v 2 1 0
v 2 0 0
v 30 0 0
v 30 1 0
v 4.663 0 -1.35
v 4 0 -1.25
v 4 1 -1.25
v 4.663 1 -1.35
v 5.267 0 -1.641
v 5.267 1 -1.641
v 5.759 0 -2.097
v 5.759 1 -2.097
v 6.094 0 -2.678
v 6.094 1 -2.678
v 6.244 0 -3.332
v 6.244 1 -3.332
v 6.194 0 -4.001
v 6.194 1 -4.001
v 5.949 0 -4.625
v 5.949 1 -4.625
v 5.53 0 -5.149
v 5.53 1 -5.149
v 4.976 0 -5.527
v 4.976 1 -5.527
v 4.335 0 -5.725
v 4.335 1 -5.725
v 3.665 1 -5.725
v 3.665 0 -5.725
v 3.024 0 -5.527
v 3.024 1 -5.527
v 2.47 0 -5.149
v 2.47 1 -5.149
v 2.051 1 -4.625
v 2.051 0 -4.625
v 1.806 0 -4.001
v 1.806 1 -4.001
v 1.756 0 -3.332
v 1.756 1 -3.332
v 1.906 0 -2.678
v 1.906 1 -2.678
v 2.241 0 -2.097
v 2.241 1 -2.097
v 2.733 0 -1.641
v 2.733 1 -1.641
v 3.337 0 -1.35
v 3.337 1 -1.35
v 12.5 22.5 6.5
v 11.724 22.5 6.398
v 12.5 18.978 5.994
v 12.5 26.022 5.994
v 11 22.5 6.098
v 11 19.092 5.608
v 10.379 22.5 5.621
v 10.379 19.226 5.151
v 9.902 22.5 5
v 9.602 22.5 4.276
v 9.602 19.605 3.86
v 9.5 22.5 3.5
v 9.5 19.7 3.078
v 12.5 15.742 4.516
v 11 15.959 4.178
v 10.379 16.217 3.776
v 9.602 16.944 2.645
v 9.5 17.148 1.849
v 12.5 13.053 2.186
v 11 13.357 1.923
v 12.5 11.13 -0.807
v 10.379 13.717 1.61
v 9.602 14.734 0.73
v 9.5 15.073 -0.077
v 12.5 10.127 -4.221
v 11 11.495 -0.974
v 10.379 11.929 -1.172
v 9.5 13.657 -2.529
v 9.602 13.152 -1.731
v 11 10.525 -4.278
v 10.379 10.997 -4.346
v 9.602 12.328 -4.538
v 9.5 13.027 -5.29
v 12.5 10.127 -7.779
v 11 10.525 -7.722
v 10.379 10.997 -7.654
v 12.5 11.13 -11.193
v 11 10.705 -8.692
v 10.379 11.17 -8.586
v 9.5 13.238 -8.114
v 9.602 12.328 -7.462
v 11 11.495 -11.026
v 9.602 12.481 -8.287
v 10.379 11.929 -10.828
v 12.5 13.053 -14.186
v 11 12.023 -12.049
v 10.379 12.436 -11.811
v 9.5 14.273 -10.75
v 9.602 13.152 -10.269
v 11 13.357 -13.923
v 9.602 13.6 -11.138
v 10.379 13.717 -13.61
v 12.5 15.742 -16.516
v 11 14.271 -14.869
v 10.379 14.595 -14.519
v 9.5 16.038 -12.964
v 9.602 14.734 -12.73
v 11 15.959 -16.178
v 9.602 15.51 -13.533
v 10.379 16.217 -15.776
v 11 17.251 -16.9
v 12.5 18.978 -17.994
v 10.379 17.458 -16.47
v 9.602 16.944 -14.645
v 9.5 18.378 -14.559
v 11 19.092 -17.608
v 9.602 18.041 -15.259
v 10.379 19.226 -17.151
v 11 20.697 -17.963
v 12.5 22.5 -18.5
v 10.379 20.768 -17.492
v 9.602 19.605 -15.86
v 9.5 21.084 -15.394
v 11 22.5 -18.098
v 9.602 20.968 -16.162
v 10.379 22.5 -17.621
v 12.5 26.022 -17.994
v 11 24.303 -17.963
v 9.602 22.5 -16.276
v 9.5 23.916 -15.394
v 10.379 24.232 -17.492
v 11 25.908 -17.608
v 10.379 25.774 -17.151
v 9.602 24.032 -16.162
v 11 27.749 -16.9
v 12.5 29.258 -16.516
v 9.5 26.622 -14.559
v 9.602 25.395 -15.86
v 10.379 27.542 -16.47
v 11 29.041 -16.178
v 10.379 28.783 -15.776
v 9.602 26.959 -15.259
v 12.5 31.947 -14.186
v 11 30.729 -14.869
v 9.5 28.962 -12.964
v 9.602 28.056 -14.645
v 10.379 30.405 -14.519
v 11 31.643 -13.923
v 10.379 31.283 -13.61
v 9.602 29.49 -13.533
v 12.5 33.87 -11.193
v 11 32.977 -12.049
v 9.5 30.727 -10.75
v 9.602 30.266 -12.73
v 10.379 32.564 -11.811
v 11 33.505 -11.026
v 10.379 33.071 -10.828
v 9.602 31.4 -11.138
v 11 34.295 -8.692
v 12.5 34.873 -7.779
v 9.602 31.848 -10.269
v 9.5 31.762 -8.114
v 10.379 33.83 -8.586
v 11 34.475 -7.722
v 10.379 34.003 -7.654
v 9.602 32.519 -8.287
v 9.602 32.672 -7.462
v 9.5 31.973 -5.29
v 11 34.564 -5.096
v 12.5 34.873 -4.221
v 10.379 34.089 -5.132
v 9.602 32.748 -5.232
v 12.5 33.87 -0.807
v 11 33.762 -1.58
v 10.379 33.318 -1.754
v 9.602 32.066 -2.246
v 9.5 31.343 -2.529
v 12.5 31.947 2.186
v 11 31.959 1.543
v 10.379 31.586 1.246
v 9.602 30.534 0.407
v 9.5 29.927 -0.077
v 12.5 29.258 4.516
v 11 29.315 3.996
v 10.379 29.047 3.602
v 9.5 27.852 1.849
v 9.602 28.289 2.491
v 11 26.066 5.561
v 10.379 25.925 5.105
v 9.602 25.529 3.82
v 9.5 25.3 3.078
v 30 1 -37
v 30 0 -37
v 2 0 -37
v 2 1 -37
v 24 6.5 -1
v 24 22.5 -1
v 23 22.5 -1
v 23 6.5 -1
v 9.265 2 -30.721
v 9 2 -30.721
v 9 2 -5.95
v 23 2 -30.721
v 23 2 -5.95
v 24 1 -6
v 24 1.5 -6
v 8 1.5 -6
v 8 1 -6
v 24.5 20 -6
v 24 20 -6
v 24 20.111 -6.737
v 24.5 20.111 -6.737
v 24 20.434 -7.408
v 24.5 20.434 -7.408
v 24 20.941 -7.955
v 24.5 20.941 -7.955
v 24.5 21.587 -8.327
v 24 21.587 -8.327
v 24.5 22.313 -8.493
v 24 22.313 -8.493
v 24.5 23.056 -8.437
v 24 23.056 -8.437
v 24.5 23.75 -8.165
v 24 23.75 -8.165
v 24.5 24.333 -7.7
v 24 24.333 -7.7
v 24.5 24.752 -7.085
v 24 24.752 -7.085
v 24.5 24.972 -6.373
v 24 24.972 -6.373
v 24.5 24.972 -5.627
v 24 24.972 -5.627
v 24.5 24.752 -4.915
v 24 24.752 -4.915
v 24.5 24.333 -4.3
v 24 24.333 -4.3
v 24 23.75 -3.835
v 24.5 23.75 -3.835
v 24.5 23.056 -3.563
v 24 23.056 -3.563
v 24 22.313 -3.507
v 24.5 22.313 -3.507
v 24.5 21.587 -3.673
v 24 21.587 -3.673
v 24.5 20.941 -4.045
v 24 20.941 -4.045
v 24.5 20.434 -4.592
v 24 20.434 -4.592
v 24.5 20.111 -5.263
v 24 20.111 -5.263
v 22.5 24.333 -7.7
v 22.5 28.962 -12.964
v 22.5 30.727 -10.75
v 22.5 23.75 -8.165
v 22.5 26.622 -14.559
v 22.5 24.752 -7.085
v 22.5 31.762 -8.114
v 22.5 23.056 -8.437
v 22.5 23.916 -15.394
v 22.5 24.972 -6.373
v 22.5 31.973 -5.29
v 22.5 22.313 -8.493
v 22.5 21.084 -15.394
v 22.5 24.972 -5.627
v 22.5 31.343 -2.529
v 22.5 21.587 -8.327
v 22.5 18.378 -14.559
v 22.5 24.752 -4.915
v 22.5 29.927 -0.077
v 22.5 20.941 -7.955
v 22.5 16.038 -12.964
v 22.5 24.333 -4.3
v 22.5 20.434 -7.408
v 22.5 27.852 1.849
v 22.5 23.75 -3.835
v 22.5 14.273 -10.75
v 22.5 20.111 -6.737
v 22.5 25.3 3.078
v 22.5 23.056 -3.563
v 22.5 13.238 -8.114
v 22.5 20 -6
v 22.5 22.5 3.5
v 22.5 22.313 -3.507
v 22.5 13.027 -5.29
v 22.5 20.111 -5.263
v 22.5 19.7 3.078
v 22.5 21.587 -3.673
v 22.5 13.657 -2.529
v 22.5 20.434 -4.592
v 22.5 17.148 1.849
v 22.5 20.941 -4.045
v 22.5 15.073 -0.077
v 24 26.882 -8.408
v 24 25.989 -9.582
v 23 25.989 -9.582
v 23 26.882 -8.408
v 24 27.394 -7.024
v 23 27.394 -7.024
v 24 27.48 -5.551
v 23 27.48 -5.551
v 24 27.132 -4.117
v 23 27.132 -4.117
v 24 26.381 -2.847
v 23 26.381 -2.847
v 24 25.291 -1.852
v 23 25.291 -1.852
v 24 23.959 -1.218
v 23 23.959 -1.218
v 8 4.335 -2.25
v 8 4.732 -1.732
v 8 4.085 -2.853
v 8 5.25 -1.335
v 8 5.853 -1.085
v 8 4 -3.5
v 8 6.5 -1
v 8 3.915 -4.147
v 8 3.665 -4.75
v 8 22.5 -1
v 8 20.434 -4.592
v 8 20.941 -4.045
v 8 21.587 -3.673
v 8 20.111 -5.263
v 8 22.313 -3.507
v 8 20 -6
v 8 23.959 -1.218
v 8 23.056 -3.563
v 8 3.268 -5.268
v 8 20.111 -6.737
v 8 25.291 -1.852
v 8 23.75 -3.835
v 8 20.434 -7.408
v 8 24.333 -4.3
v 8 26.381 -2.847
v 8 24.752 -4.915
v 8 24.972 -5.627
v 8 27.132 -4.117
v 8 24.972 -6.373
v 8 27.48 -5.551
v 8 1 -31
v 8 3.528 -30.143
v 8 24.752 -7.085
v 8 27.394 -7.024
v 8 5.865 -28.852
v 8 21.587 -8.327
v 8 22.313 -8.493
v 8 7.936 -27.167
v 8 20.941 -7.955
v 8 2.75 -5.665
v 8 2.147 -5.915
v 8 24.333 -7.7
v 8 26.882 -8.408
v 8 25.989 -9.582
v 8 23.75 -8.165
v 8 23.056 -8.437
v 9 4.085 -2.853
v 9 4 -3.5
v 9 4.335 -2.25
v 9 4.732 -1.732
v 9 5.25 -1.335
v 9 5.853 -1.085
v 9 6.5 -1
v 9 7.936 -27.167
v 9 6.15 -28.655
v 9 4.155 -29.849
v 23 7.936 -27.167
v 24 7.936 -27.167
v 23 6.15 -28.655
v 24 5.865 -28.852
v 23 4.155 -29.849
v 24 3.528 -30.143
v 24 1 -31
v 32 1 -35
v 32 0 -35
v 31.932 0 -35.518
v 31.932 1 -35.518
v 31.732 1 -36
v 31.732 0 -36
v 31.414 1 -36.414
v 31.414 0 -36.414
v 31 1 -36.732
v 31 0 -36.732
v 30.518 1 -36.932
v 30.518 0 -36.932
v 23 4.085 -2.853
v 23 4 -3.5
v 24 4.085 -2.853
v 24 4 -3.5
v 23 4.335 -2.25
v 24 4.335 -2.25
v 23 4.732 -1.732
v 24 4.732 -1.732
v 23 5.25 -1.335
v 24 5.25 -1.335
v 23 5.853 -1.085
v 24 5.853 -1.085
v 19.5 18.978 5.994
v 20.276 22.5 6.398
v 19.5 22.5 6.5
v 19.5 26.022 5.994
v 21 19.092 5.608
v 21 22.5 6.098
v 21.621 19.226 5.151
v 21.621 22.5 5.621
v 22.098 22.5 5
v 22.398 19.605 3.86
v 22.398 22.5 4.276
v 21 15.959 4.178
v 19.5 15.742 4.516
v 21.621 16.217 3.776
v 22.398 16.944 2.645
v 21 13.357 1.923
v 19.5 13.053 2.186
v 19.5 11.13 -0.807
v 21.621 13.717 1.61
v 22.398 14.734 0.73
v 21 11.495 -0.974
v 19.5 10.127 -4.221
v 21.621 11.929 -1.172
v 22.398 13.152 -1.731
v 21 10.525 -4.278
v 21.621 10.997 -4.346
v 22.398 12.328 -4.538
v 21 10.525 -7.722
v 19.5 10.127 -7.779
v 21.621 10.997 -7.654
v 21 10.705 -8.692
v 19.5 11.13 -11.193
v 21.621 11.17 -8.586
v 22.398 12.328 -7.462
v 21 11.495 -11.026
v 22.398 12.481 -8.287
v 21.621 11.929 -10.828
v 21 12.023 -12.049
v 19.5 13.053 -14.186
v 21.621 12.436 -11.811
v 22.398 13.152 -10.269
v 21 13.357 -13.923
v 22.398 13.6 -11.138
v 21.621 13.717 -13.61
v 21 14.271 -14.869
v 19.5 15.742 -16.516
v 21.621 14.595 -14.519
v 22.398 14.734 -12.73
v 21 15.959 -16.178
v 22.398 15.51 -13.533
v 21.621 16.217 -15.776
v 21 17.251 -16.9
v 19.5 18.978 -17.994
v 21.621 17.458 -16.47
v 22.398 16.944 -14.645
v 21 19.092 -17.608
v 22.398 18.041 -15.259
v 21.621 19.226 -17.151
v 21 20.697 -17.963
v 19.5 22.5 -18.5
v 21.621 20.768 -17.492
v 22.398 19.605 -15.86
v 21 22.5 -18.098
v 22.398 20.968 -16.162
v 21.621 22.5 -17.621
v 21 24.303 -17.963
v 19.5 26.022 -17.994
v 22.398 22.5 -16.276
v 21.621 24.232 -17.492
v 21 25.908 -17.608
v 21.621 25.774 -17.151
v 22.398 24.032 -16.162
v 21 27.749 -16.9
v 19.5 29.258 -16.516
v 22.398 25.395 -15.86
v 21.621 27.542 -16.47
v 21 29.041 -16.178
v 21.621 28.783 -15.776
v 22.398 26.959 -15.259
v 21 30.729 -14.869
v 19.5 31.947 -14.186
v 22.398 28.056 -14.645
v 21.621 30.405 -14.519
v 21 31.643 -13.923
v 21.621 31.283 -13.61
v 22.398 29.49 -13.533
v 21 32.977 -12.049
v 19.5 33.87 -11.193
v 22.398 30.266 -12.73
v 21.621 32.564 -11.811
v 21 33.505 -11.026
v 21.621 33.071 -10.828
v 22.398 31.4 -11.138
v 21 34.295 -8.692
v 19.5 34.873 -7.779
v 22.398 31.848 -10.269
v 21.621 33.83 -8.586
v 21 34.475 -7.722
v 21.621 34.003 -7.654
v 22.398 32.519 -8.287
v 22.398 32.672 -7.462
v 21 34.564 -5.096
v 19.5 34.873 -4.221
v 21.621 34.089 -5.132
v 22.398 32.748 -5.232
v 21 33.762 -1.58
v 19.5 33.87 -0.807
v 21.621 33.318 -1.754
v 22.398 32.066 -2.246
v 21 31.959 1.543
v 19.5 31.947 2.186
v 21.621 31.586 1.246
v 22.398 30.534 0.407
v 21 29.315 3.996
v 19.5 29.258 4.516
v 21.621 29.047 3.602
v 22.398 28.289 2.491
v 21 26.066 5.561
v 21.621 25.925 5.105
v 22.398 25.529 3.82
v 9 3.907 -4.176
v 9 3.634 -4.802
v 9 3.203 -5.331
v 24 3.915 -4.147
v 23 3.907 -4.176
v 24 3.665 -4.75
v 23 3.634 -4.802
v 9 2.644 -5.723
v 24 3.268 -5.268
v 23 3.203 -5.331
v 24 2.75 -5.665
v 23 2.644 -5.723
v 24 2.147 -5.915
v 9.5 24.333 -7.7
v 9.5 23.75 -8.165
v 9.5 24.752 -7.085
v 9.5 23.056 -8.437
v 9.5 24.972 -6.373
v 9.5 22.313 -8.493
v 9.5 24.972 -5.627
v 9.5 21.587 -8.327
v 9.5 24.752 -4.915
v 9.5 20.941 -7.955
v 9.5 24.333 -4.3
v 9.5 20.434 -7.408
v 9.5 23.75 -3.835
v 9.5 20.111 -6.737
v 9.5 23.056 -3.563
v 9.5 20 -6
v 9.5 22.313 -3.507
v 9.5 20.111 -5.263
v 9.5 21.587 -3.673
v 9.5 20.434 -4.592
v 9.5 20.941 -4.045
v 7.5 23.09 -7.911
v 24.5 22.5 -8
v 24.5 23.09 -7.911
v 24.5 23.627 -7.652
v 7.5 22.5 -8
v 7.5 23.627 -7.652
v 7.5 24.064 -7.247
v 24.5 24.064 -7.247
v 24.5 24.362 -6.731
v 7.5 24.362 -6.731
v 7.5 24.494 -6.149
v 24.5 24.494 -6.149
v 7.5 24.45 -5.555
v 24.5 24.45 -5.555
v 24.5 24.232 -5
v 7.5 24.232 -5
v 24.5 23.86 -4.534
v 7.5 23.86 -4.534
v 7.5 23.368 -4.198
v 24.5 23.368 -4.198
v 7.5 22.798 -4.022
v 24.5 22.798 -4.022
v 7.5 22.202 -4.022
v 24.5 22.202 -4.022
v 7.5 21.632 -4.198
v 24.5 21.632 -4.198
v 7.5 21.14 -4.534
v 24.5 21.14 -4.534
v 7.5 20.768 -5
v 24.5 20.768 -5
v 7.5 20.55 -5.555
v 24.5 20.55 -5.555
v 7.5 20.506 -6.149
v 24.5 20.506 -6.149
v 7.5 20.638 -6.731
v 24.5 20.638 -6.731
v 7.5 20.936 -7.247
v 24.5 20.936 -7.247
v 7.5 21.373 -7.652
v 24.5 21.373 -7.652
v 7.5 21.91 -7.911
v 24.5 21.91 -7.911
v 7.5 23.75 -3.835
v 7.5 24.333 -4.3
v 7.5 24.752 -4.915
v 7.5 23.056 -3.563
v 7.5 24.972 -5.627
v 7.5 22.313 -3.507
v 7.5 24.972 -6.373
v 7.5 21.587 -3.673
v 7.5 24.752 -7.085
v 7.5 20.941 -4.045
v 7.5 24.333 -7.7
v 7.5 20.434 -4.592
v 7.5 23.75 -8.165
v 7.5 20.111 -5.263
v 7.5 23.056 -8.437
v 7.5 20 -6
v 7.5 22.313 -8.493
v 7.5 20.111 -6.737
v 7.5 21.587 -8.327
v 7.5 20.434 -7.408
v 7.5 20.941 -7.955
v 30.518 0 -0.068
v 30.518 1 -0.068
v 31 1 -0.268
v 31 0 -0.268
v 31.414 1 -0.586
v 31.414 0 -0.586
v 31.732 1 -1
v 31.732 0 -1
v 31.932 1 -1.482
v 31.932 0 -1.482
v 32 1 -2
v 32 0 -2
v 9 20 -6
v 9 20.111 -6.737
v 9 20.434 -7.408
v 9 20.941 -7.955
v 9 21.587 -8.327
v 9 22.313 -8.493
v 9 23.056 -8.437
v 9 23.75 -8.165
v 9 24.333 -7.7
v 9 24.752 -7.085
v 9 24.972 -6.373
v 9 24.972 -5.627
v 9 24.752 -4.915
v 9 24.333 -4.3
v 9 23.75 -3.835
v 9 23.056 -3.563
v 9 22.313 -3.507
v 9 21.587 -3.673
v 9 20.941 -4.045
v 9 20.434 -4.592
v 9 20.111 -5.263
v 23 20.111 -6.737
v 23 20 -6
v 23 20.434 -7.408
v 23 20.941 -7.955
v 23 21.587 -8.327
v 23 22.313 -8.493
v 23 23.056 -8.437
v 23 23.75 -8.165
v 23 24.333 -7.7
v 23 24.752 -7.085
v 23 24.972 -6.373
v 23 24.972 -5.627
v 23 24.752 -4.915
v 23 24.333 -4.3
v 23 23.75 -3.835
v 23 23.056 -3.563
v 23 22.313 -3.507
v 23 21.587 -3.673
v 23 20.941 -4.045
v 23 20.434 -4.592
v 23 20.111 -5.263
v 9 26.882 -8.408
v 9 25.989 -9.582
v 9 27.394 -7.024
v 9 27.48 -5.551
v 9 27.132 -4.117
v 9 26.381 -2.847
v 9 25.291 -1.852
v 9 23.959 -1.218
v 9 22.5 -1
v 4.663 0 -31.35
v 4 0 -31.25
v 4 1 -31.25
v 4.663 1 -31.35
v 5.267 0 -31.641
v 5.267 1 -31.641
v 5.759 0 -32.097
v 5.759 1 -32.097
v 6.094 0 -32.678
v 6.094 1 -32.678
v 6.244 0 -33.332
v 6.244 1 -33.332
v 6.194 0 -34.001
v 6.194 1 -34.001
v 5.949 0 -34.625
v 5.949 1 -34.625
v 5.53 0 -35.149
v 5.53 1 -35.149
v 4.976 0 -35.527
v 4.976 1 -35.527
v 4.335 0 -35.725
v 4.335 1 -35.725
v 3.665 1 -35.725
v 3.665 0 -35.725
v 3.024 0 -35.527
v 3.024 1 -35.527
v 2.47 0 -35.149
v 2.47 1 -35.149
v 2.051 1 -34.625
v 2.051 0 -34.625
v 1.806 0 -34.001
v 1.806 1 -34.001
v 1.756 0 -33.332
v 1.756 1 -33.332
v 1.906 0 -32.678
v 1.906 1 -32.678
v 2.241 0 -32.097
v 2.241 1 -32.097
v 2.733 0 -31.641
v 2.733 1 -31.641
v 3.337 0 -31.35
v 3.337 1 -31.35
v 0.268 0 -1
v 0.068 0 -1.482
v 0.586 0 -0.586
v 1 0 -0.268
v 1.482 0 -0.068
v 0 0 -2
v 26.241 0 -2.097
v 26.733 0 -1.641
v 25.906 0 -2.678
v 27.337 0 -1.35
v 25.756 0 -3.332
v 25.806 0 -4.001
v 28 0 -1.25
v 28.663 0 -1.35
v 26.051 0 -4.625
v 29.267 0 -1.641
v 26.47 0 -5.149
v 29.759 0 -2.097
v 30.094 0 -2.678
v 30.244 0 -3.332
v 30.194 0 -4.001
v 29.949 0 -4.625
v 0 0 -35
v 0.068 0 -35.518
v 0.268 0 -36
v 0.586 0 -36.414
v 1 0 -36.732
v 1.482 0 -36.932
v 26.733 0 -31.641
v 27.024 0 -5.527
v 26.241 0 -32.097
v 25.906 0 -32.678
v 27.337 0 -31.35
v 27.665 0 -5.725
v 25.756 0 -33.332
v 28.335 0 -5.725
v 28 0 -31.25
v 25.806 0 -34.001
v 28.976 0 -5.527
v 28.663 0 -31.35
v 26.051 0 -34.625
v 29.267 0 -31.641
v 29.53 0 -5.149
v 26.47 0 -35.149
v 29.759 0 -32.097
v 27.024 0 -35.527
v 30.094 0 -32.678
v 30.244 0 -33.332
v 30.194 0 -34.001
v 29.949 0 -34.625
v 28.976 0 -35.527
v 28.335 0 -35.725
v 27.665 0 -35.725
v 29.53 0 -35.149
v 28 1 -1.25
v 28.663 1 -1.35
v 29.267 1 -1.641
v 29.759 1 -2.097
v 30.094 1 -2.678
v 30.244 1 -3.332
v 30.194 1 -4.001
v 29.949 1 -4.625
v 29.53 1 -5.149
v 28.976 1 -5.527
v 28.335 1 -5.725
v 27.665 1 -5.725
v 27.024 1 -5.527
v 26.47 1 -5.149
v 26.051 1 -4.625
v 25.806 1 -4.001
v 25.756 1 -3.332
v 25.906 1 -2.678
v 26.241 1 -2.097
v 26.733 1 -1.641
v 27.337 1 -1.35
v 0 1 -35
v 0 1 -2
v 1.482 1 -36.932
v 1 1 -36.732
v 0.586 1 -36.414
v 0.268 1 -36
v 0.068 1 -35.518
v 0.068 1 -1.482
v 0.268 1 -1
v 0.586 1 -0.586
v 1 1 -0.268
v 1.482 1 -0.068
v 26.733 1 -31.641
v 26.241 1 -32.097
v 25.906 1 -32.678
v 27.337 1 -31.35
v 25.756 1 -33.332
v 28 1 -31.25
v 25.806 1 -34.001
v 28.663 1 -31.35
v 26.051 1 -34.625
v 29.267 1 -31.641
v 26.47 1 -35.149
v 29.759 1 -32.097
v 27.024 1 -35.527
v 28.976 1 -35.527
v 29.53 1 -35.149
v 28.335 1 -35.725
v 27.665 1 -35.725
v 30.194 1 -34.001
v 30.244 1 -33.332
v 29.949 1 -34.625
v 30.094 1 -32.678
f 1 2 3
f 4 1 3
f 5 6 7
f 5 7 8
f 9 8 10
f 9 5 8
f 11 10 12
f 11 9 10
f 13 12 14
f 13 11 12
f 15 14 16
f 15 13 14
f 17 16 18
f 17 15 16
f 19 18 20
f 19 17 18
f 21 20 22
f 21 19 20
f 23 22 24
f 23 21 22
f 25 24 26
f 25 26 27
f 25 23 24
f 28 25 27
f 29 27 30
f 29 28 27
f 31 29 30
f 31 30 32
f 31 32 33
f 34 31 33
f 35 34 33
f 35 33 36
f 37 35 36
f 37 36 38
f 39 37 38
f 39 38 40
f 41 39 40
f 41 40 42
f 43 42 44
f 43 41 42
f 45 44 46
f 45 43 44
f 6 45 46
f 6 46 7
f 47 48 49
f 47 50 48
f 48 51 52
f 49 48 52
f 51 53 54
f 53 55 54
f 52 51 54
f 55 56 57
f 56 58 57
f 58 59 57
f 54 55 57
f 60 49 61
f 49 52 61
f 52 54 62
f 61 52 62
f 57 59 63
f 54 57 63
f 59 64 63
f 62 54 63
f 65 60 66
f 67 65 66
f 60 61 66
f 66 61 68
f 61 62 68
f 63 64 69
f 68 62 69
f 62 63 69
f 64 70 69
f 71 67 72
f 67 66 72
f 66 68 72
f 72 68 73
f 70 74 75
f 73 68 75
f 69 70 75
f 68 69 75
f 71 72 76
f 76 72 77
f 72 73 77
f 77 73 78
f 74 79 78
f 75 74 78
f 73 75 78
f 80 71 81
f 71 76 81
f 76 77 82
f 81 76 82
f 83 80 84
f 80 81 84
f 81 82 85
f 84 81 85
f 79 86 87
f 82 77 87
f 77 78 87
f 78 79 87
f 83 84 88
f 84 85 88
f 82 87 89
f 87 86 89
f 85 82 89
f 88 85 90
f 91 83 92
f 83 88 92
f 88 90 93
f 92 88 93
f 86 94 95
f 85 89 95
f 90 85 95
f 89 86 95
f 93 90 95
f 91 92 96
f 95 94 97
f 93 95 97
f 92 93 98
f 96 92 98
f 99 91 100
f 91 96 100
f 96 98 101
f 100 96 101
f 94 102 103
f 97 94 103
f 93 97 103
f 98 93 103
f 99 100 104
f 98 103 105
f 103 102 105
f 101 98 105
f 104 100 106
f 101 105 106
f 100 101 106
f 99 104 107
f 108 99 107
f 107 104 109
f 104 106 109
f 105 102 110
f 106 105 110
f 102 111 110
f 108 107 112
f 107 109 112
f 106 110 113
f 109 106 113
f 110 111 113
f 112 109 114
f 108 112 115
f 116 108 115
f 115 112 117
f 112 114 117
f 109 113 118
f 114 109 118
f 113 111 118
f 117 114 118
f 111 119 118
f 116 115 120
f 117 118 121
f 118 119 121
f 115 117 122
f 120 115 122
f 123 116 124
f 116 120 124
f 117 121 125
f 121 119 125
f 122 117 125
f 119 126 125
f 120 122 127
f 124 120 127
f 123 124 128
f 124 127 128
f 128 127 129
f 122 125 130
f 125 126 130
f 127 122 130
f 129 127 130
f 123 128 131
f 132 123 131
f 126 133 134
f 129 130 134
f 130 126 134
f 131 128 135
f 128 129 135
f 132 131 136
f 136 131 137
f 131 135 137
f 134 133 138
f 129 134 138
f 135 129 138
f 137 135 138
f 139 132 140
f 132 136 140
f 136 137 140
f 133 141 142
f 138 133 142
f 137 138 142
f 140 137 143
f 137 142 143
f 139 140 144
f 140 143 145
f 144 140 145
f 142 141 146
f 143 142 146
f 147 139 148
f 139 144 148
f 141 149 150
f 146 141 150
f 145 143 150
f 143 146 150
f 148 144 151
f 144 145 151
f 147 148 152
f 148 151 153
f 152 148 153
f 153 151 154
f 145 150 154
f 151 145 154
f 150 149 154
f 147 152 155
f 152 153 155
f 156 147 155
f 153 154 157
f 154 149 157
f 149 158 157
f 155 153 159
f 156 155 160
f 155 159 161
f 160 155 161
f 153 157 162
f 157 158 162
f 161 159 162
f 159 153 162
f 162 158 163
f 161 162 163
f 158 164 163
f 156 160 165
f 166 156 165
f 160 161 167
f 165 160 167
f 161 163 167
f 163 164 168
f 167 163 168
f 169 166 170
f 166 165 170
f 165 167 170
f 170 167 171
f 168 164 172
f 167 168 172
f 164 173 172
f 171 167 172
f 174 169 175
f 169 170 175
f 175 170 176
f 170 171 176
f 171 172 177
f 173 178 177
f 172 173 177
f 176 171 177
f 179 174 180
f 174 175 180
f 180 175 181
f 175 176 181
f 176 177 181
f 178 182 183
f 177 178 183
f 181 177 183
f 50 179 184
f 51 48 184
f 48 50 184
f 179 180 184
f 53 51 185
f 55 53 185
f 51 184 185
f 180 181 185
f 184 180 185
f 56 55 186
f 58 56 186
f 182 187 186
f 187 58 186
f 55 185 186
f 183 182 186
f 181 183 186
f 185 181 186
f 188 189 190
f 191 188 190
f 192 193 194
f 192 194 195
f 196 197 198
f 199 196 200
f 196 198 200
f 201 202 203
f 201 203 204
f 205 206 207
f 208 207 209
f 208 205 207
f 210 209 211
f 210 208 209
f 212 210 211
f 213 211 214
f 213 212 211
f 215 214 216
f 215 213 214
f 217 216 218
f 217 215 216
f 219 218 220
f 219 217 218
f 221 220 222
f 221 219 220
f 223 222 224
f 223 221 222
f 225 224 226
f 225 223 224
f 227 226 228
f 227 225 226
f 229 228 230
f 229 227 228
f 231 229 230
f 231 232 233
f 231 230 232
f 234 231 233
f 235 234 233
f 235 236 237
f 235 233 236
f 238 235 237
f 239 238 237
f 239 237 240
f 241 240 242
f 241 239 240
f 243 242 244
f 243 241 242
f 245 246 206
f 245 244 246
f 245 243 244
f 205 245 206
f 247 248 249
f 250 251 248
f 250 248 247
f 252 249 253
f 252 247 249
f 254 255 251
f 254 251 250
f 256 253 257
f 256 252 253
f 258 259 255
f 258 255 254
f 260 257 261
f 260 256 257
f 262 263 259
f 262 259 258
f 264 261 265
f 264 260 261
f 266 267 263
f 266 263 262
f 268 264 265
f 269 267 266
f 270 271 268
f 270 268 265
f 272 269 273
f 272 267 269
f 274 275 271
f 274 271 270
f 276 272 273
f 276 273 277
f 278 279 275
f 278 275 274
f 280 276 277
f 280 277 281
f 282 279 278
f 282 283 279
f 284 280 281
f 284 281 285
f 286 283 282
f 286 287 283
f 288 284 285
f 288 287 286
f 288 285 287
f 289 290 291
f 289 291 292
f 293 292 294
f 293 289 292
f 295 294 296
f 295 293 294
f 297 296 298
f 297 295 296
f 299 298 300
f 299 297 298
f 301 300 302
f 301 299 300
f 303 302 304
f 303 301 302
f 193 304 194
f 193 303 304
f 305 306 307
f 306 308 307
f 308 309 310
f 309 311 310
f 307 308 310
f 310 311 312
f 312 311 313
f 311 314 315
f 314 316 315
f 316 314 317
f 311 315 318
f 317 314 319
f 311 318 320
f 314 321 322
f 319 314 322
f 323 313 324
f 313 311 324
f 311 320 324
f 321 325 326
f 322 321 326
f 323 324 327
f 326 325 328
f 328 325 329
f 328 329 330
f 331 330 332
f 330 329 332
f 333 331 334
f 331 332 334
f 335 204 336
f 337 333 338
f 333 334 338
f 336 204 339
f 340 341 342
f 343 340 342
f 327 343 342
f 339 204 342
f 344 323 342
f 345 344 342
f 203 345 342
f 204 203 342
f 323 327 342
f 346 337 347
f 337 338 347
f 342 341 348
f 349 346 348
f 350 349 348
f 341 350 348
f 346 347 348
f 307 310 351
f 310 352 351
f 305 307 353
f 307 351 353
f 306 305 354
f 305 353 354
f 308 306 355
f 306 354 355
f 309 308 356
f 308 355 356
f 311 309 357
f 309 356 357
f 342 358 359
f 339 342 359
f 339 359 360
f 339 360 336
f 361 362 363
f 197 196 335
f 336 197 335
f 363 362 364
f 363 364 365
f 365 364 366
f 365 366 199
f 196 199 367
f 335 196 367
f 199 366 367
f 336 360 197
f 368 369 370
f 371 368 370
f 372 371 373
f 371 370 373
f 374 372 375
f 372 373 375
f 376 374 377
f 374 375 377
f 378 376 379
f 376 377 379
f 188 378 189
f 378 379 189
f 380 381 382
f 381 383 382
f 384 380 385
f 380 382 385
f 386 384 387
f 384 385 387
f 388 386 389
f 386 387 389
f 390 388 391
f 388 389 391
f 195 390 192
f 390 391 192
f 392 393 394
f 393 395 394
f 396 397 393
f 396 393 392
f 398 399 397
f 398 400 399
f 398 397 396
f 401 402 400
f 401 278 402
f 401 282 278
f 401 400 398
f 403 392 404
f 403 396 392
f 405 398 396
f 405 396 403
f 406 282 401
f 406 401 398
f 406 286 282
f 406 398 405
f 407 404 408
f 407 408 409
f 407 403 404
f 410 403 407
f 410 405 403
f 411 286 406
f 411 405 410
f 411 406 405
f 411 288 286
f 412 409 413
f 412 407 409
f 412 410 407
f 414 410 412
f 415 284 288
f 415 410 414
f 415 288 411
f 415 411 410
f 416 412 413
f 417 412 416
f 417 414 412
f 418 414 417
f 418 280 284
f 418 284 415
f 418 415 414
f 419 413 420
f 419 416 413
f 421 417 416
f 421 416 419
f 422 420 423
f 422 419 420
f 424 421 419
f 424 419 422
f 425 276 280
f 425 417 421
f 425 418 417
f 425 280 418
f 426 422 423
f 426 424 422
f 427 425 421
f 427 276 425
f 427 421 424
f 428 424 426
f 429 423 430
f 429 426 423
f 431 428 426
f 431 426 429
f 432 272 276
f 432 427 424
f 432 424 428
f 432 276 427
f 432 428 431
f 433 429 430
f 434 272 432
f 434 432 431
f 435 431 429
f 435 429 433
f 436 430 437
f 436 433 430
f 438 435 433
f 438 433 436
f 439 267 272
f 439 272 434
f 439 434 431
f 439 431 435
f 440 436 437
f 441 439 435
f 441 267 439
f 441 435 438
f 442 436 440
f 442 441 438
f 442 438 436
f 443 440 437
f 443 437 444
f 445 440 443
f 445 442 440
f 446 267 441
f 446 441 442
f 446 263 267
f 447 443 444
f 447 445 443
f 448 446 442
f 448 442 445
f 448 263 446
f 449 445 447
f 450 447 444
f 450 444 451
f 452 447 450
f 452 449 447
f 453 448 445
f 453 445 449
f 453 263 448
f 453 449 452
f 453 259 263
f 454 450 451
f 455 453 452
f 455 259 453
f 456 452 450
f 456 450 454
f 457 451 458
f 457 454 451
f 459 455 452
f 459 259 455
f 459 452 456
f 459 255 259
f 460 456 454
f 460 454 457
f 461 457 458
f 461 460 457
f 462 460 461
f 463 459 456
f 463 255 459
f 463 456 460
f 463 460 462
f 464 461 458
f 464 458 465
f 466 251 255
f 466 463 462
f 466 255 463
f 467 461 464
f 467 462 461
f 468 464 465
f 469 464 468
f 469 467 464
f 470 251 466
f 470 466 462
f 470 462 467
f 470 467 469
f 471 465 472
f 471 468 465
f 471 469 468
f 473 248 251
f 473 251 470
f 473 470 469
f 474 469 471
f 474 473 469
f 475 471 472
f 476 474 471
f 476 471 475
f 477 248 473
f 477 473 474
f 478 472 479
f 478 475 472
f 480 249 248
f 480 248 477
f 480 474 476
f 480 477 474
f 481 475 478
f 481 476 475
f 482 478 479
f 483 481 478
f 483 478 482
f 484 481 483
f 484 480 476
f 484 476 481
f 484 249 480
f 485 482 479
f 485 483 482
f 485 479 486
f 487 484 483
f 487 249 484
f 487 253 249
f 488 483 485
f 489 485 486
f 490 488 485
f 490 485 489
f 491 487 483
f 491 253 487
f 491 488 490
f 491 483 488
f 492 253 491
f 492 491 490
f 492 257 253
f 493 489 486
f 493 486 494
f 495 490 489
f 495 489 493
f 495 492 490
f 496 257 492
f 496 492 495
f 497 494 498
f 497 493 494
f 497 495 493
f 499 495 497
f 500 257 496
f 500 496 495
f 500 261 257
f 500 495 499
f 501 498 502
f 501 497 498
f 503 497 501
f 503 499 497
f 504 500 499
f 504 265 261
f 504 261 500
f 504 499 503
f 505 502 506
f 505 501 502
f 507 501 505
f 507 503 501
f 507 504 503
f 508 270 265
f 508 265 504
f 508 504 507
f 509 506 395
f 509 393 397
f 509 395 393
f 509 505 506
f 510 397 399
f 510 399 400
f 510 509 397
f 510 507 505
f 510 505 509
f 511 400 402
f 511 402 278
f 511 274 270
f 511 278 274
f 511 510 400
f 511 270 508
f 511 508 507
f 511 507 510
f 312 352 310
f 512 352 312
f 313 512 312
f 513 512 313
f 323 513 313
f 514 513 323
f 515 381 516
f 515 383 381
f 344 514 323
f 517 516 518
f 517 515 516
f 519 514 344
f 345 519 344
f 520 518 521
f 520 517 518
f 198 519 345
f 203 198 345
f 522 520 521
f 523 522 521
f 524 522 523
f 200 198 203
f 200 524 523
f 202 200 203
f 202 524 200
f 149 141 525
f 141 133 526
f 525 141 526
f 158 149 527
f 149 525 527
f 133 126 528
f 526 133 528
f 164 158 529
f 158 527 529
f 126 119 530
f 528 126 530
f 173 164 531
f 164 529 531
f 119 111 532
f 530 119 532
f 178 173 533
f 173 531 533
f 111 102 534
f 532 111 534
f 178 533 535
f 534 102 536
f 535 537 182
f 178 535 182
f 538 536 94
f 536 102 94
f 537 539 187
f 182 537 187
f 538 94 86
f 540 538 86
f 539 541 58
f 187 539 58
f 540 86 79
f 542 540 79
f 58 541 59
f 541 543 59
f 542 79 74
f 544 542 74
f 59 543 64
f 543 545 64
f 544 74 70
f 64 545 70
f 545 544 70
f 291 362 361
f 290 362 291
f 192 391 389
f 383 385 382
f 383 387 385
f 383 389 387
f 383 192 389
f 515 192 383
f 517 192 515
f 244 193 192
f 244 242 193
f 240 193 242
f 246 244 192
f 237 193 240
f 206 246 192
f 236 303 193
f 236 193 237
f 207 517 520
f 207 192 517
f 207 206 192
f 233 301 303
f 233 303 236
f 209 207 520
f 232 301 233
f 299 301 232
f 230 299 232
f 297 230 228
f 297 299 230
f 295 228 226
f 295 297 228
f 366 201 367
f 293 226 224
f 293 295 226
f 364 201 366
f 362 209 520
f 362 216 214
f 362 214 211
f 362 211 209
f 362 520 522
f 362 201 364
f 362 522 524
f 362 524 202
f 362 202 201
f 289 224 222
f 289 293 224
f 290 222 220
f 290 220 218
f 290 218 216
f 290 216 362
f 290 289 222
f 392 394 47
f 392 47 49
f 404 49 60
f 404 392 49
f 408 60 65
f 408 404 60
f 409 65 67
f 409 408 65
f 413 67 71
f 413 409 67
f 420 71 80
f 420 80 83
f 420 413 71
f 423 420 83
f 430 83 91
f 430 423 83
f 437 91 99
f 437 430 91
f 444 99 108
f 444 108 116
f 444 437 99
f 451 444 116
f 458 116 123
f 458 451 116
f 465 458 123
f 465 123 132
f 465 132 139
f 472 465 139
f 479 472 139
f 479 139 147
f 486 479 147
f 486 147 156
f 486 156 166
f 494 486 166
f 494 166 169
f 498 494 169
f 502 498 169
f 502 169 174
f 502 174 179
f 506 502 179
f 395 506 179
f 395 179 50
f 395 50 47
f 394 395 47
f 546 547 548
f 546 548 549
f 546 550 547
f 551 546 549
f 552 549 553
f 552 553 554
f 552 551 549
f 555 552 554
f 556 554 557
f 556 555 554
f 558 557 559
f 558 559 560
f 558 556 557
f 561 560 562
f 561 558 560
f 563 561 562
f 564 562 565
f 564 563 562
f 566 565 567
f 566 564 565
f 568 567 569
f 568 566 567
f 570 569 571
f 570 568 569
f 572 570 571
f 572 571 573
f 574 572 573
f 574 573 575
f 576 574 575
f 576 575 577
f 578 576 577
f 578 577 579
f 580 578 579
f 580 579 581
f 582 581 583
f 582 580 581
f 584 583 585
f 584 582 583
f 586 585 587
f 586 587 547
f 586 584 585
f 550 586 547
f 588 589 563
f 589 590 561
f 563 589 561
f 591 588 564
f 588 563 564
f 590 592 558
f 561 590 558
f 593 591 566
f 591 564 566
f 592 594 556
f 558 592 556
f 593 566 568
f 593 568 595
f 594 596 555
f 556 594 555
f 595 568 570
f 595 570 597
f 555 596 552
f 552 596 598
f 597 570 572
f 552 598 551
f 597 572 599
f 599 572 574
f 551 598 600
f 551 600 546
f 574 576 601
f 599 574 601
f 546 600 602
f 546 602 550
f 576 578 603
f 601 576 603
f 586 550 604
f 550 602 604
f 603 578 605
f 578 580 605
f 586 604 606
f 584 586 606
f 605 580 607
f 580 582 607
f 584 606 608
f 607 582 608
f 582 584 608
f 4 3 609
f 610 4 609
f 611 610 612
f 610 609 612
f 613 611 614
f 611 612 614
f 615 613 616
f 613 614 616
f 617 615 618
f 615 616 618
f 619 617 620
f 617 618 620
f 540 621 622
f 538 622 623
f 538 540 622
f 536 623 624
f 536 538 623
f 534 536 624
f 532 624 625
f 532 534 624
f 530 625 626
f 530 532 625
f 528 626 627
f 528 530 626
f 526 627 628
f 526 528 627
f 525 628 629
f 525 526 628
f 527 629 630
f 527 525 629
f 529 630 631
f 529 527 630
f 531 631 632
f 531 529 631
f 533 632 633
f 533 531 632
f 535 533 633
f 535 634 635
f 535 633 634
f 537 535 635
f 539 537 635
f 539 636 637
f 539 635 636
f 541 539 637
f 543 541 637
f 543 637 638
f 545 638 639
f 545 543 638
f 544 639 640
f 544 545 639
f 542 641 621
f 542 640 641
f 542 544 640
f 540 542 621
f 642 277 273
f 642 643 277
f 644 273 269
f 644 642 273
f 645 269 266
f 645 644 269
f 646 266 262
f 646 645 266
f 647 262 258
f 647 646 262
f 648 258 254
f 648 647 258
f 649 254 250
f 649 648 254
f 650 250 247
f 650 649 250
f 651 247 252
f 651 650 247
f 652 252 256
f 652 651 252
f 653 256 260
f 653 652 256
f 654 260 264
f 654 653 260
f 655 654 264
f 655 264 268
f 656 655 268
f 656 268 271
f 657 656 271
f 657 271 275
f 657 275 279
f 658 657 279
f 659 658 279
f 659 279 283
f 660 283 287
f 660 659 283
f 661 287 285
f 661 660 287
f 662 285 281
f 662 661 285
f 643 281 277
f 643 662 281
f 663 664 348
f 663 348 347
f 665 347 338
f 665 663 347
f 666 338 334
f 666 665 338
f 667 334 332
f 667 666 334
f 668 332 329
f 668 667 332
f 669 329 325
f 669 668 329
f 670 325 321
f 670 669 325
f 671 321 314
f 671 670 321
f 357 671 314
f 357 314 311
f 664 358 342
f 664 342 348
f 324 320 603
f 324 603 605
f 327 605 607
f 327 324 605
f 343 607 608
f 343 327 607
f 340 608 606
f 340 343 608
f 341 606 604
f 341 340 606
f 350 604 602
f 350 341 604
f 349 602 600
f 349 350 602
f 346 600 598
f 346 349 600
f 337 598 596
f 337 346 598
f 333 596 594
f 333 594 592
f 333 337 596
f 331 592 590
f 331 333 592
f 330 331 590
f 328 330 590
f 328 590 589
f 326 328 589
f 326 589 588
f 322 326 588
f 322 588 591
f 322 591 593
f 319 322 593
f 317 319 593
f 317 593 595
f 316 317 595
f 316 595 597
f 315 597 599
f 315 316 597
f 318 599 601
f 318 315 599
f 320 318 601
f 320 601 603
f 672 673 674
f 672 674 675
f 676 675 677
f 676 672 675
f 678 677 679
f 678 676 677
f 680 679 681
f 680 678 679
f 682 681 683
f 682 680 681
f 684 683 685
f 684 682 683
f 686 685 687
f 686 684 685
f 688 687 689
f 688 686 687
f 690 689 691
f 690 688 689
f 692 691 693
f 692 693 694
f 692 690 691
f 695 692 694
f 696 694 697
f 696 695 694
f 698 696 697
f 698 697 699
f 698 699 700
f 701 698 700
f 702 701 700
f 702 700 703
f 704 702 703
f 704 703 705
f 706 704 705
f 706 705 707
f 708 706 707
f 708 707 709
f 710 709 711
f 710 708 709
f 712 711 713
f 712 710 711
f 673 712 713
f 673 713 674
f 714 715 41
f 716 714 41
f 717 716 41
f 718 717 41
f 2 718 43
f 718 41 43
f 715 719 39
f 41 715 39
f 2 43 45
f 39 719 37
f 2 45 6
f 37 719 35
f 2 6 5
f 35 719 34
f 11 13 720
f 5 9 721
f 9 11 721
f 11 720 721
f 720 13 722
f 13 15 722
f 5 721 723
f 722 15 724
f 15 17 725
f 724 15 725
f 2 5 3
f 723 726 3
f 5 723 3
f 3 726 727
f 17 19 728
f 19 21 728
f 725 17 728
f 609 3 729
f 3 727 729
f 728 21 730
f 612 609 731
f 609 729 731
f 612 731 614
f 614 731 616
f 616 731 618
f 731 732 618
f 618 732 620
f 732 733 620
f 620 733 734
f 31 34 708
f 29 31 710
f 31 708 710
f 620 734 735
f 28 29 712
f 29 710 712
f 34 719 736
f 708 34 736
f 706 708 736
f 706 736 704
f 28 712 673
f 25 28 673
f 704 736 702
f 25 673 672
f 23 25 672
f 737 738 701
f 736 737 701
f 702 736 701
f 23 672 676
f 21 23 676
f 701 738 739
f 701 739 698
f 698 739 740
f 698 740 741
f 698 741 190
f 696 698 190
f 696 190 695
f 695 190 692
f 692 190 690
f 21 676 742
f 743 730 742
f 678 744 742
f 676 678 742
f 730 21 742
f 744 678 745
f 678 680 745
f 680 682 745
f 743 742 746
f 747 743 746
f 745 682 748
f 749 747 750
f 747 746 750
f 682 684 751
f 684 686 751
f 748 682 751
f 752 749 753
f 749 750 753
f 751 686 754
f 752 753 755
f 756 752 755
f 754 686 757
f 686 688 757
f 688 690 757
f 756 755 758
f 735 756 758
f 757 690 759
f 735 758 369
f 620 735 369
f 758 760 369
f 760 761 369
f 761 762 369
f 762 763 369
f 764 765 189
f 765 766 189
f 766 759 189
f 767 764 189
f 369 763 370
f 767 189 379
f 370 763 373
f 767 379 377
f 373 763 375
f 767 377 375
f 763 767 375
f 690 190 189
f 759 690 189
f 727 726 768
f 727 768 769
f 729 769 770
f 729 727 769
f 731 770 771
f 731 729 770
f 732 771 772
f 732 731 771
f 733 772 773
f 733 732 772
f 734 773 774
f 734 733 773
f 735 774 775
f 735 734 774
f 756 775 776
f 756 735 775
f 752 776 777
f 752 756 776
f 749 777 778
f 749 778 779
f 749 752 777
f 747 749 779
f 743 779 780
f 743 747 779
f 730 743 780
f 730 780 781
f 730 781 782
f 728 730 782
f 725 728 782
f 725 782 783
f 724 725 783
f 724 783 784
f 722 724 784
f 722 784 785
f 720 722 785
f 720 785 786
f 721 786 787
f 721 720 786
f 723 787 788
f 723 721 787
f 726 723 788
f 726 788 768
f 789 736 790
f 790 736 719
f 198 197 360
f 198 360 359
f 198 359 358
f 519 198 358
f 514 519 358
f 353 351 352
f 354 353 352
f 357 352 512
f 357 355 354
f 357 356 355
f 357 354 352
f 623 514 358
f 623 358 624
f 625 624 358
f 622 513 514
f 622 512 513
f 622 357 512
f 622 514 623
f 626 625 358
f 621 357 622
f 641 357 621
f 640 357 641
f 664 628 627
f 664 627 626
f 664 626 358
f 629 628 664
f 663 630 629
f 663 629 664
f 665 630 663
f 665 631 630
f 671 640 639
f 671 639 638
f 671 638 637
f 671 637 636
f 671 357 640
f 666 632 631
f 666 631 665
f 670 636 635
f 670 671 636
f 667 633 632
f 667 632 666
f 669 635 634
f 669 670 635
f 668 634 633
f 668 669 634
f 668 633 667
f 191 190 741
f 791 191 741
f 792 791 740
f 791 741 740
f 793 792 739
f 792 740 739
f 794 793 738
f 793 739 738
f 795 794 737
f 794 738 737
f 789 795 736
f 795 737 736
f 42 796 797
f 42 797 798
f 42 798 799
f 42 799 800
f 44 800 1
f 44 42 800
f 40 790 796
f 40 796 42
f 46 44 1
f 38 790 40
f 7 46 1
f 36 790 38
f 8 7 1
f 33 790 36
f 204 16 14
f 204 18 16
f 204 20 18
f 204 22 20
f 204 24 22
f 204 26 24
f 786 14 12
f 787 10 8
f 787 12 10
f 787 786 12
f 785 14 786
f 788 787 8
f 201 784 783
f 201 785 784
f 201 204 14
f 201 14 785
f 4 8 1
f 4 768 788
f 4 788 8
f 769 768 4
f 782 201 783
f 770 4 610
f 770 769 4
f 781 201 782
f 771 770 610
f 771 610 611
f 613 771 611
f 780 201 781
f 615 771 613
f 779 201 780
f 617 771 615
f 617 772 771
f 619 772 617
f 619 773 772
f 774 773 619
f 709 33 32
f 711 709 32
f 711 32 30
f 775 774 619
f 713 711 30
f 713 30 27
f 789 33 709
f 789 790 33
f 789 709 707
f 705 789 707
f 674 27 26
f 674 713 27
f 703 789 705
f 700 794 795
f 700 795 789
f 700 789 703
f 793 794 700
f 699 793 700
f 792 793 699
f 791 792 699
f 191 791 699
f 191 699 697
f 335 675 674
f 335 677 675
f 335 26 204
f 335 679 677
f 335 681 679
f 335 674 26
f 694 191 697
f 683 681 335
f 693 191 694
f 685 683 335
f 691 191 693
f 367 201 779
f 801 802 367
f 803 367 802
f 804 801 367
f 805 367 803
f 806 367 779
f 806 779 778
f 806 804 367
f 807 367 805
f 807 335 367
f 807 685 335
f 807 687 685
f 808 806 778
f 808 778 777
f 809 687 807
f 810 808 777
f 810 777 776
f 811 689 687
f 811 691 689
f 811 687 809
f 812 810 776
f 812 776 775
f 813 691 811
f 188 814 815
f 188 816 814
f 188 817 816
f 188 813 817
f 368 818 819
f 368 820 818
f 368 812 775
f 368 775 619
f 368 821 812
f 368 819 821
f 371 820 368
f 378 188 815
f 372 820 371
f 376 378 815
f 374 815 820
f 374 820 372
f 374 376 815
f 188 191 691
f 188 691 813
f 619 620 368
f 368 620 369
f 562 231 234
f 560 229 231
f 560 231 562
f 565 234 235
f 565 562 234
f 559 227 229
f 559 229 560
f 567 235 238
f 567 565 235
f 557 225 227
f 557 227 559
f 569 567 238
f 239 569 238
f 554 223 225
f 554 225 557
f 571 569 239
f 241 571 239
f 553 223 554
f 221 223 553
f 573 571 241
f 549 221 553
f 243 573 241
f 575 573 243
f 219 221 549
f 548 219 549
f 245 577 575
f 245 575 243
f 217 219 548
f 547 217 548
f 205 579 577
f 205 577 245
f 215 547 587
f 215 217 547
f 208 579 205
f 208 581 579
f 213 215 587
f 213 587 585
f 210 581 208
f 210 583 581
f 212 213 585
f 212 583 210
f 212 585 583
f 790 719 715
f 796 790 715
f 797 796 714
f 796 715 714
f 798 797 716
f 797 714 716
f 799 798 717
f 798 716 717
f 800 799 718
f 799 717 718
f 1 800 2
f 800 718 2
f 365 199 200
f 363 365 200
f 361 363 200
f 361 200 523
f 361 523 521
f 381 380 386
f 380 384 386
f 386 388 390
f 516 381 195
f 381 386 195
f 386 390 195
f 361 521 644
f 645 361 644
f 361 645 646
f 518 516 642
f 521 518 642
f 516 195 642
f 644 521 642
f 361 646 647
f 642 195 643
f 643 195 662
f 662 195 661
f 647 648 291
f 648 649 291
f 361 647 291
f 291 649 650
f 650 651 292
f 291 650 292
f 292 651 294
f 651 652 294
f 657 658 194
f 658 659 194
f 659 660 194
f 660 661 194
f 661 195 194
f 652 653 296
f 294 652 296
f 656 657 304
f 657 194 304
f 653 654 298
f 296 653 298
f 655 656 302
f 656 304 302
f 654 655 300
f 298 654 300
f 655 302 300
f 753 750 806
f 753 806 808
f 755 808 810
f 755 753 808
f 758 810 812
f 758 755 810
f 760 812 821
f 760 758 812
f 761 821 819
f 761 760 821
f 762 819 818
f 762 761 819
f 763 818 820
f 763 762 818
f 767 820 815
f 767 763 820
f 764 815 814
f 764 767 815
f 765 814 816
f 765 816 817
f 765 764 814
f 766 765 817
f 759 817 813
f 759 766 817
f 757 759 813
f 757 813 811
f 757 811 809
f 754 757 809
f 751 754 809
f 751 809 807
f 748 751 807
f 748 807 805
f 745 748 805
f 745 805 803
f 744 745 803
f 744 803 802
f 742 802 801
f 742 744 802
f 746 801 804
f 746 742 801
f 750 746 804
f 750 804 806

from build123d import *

# Parameters (mm, degrees)
ESBO_O1_R                = 2.25
RESSALTO_EXTRUS_O1_DEPTH = 1
ESBO_O2_R                = 2.5
RESSALTO_EXTRUS_O2_DEPTH = 8
ESBO_O3_W                = 14
ESBO_O3_H                = 25.5
CORTE_EXTRUS_O1_DEPTH    = 56.463952257
ESBO_O5_R                = 12.5
ESBO_O5_R_2              = 2.5
RESSALTO_EXTRUS_O3_DEPTH = 6.5
FILETE1_R                = 3
ESBO_O6_R                = 2.5
ESBO_O6_R_2              = 2
RESSALTO_EXTRUS_O4_DEPTH = 8.5
FILETE2_R                = 2.5
FILETE3_R                = 15


# Some blends are built 0.0001 mm under size
with BuildPart() as part:
    # Esboço1 → Ressalto-extrusão1 (new body)
    with BuildSketch(Plane(origin=(0, 0, 0), x_dir=(1, 0, 0), z_dir=(0, 1, 0))):
        with BuildLine():
            Line((2, 0), (30, 0))
            ThreePointArc((30, 0), (31.414213562, 0.585786438), (32, 2))
            Line((32, 2), (32, 35))
            ThreePointArc((32, 35), (31.414213562, 36.414213562), (30, 37))
            Line((30, 37), (2, 37))
            ThreePointArc((2, 37), (0.585786438, 36.414213562), (0, 35))
            Line((0, 35), (0, 2))
            ThreePointArc((0, 2), (0.585786438, 0.585786438), (2, 0))
        make_face()
        with Locations(Location((4, 33.5, 0), (0, 0, 270))):
            Circle(ESBO_O1_R, mode=Mode.SUBTRACT)
        with Locations(Location((28, 33.5, 0), (0, 0, 270))):
            Circle(ESBO_O1_R, mode=Mode.SUBTRACT)
        with Locations(Location((4, 3.5, 0), (0, 0, 270))):
            Circle(ESBO_O1_R, mode=Mode.SUBTRACT)
        with Locations(Location((28, 3.5, 0), (0, 0, 270))):
            Circle(ESBO_O1_R, mode=Mode.SUBTRACT)
    extrude(amount=RESSALTO_EXTRUS_O1_DEPTH)

    # Esboço2 → Ressalto-extrusão2 (add, symmetric)
    with BuildSketch(Plane(origin=(16, 0, 0), x_dir=(0, 0, -1), z_dir=(1, 0, 0))):
        with BuildLine():
            Line((1, 22.5), (1, 4))
            Line((1, 4), (6, 4))
            Line((6, 4), (6, 1))
            Line((6, 1), (31, 1))
            Line((31, 1), (31, 4))
            Line((31, 4), (9.581688719, 25.988768539))
            ThreePointArc((9.581688719, 25.988768539), (4.116976314, 27.131870227), (1, 22.5))
        make_face()
        with Locations((6, 22.5)):
            Circle(ESBO_O2_R, mode=Mode.SUBTRACT)
    extrude(amount=RESSALTO_EXTRUS_O2_DEPTH, both=True)

    # Esboço3 → Corte-extrusão1 (cut, through all)
    with BuildSketch(Plane.XY.offset(-1)):
        with Locations((16, 14.75)):
            Rectangle(ESBO_O3_W, ESBO_O3_H)
    extrude(amount=-CORTE_EXTRUS_O1_DEPTH, mode=Mode.SUBTRACT)



with BuildPart() as body_2:
    # Esboço5 → Ressalto-extrusão3 (new, symmetric)
    with BuildSketch(Plane(origin=(16, 0, 0), x_dir=(0, 0, -1), z_dir=(1, 0, 0))):
        with Locations(Location((6, 22.5, 0), (0, 0, 180))):
            Circle(ESBO_O5_R)
        with Locations(Location((6, 22.5, 0), (0, 0, 270))):
            Circle(ESBO_O5_R_2, mode=Mode.SUBTRACT)
    extrude(amount=RESSALTO_EXTRUS_O3_DEPTH, both=True)

    # Filete1
    filete1_edges = [body_2.edges().sort_by_distance(p)[0] for p in [
        (9.5, 22.5, -18.5),
        (22.5, 22.5, -18.5),
    ]]
    fillet(filete1_edges, radius=FILETE1_R)


with BuildPart() as part_1:
    add(part.part)

    add(body_2.part)  # Ressalto-extrusão4 merges body 2
    # Esboço6 → Ressalto-extrusão4 (add, symmetric)
    with BuildSketch(Plane(origin=(16, 0, 0), x_dir=(0, 0, -1), z_dir=(1, 0, 0))):
        with Locations(Location((6, 22.5, 0), (0, 0, 270))):
            Circle(ESBO_O6_R)
        with Locations((6, 22.5)):
            Circle(ESBO_O6_R_2, mode=Mode.SUBTRACT)
    extrude(amount=RESSALTO_EXTRUS_O4_DEPTH, both=True)

    # Filete2
    filete2_edges = [part_1.edges().sort_by_distance(p)[0] for p in [
        (23.5, 4, -6),
        (8.5, 4, -1),
        (23.5, 4, -1),
    ]]
    fillet(filete2_edges, radius=FILETE2_R - 0.0001)  # a hair under: the kernel refuses the full size

    # Filete3
    # the kernel refuses this fillet: 15 mm, written as the material it takes off along each edge
    with BuildSketch(Plane(origin=(37.735072013, 4, -31), x_dir=(0, -1, 0), z_dir=(-1, 0, 0))) as filete3_piece_1:
        with BuildLine():
            CenterArc((6.530725419, 14.578545127), FILETE3_R, 225.752939657, 30.632936919)
            Line((-3.935580199, 3.83347897), (0, 0))
            Line((0, 0), (3, 0))
        make_face()
    extrude(amount=28.470144026, mode=Mode.SUBTRACT)
    with BuildSketch(Plane(origin=(22.735072013, 4, -31), x_dir=(0, 0.7163377438018307, 0.6977537078403117), z_dir=(-1, 0, 0))) as filete3_piece_2:
        with BuildLine():
            CenterArc((5.494028805, -15), FILETE3_R, 90, 30.632936919)
            Line((-2.149013231, -2.093261124), (0, 0))
            Line((0, 0), (5.494028805, 0))
        make_face()
    extrude(amount=28.470144026, mode=Mode.SUBTRACT)


solid = part_1.part
